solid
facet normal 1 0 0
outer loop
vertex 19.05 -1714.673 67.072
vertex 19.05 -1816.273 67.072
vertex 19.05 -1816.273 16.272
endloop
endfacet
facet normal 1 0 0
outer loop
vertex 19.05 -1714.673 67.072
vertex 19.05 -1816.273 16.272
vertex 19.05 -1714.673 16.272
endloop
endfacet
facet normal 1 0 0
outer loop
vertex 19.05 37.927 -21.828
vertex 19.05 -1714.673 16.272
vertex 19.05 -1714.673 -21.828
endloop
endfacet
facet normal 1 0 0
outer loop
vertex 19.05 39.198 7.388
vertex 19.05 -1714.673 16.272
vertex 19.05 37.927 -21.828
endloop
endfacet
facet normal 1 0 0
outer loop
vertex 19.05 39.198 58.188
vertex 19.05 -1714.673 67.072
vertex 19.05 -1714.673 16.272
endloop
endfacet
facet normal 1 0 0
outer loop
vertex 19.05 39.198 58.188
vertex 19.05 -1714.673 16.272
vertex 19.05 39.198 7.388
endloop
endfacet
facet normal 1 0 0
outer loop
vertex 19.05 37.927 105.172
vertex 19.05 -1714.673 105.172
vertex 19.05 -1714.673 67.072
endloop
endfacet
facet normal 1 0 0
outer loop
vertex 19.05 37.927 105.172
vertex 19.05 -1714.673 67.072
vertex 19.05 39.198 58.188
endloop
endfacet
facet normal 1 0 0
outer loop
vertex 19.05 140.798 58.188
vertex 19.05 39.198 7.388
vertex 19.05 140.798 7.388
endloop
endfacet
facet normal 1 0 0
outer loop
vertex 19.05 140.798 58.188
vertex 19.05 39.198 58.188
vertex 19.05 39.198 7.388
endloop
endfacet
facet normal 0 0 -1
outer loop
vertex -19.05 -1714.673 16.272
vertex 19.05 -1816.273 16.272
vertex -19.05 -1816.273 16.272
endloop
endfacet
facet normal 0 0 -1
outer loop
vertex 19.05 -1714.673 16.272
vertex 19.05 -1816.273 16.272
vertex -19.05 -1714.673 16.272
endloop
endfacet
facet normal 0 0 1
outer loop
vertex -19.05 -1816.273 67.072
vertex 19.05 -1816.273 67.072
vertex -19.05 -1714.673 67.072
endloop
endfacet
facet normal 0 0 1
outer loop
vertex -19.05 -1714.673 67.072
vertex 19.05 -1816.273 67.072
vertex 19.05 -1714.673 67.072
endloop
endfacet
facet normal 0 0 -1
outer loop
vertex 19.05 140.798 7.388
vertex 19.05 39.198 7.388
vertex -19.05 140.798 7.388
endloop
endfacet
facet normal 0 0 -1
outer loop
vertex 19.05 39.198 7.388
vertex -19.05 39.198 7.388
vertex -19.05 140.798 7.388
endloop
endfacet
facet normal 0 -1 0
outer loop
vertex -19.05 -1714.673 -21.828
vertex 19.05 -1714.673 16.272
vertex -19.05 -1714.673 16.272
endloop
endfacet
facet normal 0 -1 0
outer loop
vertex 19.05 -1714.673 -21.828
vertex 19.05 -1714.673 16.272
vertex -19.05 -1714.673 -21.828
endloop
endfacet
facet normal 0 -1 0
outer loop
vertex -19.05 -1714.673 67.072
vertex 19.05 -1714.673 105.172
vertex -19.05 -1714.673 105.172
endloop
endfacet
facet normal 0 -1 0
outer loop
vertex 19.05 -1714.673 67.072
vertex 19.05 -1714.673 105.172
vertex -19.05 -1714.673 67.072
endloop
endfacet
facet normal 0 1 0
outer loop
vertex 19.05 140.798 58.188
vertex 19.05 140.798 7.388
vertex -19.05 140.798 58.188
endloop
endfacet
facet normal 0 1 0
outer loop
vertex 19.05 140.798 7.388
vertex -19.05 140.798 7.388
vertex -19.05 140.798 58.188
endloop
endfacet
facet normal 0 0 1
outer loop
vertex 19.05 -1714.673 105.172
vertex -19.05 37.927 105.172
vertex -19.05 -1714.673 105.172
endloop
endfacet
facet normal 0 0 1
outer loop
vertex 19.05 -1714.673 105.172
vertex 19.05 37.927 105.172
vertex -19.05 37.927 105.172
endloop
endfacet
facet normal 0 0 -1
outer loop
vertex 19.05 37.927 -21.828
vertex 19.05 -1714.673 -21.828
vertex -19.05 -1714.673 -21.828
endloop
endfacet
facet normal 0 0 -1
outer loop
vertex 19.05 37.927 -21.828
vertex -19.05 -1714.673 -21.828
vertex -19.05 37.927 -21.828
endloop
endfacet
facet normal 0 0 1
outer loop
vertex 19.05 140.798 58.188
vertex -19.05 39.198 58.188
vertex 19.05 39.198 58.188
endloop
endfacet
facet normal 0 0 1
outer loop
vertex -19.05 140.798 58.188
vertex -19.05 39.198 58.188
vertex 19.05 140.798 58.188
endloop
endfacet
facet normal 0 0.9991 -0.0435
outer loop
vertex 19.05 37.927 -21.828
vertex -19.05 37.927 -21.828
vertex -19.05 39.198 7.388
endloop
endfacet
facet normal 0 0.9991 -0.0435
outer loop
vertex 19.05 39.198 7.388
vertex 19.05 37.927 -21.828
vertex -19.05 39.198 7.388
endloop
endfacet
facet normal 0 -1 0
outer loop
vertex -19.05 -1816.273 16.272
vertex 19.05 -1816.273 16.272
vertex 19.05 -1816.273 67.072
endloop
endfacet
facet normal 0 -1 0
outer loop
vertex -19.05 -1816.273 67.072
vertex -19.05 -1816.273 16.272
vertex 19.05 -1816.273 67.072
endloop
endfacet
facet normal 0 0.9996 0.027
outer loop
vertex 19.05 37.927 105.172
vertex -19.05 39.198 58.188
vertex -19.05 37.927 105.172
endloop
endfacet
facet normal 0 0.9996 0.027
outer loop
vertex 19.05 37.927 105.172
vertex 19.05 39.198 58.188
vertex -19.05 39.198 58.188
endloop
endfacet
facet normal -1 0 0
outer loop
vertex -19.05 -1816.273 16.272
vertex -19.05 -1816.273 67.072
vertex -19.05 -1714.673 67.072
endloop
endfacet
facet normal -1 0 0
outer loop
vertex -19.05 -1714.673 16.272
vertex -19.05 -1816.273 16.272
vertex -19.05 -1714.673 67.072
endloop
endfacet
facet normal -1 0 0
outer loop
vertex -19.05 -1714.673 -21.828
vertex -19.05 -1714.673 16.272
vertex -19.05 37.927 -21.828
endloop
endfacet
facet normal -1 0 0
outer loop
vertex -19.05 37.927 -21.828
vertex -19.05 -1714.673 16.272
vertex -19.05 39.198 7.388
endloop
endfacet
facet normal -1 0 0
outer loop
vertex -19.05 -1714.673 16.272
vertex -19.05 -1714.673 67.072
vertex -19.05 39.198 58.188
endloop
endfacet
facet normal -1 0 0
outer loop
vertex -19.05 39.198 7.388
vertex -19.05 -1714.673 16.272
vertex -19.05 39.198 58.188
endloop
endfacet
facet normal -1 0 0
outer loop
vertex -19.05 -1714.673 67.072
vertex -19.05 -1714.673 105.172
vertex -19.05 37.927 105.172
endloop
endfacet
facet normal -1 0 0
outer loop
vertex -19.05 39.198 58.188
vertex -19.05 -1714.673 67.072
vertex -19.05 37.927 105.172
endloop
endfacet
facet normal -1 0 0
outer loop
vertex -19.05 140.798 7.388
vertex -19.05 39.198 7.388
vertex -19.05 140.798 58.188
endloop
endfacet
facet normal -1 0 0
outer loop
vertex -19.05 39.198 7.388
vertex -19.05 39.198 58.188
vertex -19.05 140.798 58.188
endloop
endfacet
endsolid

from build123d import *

# Parameters (mm, degrees)
F1_DEPTH = 19.05
F0_W     = 101.6
F0_H     = 50.8
F2_DEPTH = 19.05


with BuildPart() as f1:
    # F0 (on Right) → F1 (new body, symmetric)
    with BuildSketch(Plane.YZ):
        Polygon((-1714.672583, 105.171546), (-1714.672583, 67.071546), (-1714.672583, 16.271546), (-1714.672583, -21.828454), (37.927417, -21.828454), (39.198343, 7.38804), (39.198343, 58.18804), (37.927417, 105.171546), align=None)
    extrude(amount=F1_DEPTH, both=True)

    # F0 (on Right) → F2 (join, symmetric)
    with BuildSketch(Plane.YZ):
        with Locations((89.998343, 32.78804)):
            Rectangle(F0_W, F0_H)
        with Locations((-1765.472583, 41.671546)):
            Rectangle(F0_W, F0_H)
    extrude(amount=F2_DEPTH, both=True)


solid = f1.part
